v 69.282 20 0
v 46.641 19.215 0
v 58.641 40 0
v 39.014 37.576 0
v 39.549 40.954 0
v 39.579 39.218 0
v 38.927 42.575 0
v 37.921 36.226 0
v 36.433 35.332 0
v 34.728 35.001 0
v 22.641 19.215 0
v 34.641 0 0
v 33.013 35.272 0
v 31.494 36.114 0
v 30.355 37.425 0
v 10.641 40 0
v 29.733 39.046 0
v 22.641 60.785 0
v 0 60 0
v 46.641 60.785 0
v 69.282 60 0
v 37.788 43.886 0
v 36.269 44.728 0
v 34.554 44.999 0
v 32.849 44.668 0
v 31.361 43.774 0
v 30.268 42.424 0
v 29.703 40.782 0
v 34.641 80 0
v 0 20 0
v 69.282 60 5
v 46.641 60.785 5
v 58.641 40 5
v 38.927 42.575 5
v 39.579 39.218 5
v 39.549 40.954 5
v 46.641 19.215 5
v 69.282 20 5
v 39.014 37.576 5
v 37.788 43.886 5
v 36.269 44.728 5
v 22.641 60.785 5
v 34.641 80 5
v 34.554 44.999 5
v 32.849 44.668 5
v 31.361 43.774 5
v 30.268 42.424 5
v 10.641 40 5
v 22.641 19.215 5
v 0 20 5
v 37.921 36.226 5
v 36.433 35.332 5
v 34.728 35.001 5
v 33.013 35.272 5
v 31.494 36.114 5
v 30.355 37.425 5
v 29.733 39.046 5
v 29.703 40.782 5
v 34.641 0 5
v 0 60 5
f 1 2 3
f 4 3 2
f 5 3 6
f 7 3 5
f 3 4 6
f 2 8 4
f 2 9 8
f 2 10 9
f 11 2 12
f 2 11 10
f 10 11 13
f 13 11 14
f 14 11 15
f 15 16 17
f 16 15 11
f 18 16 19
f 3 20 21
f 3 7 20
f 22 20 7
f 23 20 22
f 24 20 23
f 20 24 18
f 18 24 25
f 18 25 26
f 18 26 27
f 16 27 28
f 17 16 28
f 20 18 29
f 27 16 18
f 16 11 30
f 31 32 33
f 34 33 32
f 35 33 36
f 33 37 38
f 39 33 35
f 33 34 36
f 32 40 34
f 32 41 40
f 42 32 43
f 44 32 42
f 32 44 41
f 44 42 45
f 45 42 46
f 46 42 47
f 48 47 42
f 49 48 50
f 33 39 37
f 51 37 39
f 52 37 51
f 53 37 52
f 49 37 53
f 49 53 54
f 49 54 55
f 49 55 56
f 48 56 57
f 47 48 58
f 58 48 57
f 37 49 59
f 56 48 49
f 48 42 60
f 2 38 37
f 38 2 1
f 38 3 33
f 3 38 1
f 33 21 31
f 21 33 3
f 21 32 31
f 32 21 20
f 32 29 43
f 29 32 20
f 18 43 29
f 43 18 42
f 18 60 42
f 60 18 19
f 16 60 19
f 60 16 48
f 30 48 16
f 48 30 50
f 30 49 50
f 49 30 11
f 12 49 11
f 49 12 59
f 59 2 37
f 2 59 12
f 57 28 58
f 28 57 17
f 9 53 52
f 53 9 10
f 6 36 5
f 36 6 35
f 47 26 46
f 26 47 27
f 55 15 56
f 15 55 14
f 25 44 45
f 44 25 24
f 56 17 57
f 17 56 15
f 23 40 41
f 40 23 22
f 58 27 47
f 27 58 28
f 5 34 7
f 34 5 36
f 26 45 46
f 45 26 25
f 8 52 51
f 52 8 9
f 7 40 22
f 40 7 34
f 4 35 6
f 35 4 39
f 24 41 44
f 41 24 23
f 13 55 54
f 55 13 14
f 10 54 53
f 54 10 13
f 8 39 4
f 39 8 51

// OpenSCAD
$fn = 32;

// ----------------------------------------------------------------------
// Star wheel: 6-point blunt, R40
// ----------------------------------------------------------------------

// --- parameters (mm) ---
n_points = 6;             // number of points / teeth
r_out = 40;               // tip radius
r_in = 24;                // root radius
bore_r = 5;               // centre bore radius
plate_t = 5;              // plate thickness, Z (extrusion height)
bore_d = 10;              // centre bore diameter

profile = [[34.641, 80], [22.641, 60.785], [0, 60], [10.641, 40], [0, 20], [22.641, 19.215], [34.641, 0], [46.641, 19.215], [69.282, 20], [58.641, 40], [69.282, 60], [46.641, 60.785]];  // primary outline, 12 points, counter clockwise
void_1 = [[39.549, 40.954], [38.927, 42.575], [37.788, 43.886], [36.269, 44.728], [34.554, 44.999], [32.849, 44.668], [31.361, 43.774], [30.268, 42.424], [29.703, 40.782], [29.733, 39.046], [30.355, 37.425], [31.494, 36.114], [33.013, 35.272], [34.728, 35.001], [36.433, 35.332], [37.921, 36.226], [39.014, 37.576], [39.579, 39.218]];  // centre bore, 18 points

// --- the one profile operation ---
difference() {
  linear_extrude(height = plate_t) polygon(points = profile);
  translate([0, 0, -1])
    linear_extrude(height = plate_t + 2) polygon(points = void_1);
}
